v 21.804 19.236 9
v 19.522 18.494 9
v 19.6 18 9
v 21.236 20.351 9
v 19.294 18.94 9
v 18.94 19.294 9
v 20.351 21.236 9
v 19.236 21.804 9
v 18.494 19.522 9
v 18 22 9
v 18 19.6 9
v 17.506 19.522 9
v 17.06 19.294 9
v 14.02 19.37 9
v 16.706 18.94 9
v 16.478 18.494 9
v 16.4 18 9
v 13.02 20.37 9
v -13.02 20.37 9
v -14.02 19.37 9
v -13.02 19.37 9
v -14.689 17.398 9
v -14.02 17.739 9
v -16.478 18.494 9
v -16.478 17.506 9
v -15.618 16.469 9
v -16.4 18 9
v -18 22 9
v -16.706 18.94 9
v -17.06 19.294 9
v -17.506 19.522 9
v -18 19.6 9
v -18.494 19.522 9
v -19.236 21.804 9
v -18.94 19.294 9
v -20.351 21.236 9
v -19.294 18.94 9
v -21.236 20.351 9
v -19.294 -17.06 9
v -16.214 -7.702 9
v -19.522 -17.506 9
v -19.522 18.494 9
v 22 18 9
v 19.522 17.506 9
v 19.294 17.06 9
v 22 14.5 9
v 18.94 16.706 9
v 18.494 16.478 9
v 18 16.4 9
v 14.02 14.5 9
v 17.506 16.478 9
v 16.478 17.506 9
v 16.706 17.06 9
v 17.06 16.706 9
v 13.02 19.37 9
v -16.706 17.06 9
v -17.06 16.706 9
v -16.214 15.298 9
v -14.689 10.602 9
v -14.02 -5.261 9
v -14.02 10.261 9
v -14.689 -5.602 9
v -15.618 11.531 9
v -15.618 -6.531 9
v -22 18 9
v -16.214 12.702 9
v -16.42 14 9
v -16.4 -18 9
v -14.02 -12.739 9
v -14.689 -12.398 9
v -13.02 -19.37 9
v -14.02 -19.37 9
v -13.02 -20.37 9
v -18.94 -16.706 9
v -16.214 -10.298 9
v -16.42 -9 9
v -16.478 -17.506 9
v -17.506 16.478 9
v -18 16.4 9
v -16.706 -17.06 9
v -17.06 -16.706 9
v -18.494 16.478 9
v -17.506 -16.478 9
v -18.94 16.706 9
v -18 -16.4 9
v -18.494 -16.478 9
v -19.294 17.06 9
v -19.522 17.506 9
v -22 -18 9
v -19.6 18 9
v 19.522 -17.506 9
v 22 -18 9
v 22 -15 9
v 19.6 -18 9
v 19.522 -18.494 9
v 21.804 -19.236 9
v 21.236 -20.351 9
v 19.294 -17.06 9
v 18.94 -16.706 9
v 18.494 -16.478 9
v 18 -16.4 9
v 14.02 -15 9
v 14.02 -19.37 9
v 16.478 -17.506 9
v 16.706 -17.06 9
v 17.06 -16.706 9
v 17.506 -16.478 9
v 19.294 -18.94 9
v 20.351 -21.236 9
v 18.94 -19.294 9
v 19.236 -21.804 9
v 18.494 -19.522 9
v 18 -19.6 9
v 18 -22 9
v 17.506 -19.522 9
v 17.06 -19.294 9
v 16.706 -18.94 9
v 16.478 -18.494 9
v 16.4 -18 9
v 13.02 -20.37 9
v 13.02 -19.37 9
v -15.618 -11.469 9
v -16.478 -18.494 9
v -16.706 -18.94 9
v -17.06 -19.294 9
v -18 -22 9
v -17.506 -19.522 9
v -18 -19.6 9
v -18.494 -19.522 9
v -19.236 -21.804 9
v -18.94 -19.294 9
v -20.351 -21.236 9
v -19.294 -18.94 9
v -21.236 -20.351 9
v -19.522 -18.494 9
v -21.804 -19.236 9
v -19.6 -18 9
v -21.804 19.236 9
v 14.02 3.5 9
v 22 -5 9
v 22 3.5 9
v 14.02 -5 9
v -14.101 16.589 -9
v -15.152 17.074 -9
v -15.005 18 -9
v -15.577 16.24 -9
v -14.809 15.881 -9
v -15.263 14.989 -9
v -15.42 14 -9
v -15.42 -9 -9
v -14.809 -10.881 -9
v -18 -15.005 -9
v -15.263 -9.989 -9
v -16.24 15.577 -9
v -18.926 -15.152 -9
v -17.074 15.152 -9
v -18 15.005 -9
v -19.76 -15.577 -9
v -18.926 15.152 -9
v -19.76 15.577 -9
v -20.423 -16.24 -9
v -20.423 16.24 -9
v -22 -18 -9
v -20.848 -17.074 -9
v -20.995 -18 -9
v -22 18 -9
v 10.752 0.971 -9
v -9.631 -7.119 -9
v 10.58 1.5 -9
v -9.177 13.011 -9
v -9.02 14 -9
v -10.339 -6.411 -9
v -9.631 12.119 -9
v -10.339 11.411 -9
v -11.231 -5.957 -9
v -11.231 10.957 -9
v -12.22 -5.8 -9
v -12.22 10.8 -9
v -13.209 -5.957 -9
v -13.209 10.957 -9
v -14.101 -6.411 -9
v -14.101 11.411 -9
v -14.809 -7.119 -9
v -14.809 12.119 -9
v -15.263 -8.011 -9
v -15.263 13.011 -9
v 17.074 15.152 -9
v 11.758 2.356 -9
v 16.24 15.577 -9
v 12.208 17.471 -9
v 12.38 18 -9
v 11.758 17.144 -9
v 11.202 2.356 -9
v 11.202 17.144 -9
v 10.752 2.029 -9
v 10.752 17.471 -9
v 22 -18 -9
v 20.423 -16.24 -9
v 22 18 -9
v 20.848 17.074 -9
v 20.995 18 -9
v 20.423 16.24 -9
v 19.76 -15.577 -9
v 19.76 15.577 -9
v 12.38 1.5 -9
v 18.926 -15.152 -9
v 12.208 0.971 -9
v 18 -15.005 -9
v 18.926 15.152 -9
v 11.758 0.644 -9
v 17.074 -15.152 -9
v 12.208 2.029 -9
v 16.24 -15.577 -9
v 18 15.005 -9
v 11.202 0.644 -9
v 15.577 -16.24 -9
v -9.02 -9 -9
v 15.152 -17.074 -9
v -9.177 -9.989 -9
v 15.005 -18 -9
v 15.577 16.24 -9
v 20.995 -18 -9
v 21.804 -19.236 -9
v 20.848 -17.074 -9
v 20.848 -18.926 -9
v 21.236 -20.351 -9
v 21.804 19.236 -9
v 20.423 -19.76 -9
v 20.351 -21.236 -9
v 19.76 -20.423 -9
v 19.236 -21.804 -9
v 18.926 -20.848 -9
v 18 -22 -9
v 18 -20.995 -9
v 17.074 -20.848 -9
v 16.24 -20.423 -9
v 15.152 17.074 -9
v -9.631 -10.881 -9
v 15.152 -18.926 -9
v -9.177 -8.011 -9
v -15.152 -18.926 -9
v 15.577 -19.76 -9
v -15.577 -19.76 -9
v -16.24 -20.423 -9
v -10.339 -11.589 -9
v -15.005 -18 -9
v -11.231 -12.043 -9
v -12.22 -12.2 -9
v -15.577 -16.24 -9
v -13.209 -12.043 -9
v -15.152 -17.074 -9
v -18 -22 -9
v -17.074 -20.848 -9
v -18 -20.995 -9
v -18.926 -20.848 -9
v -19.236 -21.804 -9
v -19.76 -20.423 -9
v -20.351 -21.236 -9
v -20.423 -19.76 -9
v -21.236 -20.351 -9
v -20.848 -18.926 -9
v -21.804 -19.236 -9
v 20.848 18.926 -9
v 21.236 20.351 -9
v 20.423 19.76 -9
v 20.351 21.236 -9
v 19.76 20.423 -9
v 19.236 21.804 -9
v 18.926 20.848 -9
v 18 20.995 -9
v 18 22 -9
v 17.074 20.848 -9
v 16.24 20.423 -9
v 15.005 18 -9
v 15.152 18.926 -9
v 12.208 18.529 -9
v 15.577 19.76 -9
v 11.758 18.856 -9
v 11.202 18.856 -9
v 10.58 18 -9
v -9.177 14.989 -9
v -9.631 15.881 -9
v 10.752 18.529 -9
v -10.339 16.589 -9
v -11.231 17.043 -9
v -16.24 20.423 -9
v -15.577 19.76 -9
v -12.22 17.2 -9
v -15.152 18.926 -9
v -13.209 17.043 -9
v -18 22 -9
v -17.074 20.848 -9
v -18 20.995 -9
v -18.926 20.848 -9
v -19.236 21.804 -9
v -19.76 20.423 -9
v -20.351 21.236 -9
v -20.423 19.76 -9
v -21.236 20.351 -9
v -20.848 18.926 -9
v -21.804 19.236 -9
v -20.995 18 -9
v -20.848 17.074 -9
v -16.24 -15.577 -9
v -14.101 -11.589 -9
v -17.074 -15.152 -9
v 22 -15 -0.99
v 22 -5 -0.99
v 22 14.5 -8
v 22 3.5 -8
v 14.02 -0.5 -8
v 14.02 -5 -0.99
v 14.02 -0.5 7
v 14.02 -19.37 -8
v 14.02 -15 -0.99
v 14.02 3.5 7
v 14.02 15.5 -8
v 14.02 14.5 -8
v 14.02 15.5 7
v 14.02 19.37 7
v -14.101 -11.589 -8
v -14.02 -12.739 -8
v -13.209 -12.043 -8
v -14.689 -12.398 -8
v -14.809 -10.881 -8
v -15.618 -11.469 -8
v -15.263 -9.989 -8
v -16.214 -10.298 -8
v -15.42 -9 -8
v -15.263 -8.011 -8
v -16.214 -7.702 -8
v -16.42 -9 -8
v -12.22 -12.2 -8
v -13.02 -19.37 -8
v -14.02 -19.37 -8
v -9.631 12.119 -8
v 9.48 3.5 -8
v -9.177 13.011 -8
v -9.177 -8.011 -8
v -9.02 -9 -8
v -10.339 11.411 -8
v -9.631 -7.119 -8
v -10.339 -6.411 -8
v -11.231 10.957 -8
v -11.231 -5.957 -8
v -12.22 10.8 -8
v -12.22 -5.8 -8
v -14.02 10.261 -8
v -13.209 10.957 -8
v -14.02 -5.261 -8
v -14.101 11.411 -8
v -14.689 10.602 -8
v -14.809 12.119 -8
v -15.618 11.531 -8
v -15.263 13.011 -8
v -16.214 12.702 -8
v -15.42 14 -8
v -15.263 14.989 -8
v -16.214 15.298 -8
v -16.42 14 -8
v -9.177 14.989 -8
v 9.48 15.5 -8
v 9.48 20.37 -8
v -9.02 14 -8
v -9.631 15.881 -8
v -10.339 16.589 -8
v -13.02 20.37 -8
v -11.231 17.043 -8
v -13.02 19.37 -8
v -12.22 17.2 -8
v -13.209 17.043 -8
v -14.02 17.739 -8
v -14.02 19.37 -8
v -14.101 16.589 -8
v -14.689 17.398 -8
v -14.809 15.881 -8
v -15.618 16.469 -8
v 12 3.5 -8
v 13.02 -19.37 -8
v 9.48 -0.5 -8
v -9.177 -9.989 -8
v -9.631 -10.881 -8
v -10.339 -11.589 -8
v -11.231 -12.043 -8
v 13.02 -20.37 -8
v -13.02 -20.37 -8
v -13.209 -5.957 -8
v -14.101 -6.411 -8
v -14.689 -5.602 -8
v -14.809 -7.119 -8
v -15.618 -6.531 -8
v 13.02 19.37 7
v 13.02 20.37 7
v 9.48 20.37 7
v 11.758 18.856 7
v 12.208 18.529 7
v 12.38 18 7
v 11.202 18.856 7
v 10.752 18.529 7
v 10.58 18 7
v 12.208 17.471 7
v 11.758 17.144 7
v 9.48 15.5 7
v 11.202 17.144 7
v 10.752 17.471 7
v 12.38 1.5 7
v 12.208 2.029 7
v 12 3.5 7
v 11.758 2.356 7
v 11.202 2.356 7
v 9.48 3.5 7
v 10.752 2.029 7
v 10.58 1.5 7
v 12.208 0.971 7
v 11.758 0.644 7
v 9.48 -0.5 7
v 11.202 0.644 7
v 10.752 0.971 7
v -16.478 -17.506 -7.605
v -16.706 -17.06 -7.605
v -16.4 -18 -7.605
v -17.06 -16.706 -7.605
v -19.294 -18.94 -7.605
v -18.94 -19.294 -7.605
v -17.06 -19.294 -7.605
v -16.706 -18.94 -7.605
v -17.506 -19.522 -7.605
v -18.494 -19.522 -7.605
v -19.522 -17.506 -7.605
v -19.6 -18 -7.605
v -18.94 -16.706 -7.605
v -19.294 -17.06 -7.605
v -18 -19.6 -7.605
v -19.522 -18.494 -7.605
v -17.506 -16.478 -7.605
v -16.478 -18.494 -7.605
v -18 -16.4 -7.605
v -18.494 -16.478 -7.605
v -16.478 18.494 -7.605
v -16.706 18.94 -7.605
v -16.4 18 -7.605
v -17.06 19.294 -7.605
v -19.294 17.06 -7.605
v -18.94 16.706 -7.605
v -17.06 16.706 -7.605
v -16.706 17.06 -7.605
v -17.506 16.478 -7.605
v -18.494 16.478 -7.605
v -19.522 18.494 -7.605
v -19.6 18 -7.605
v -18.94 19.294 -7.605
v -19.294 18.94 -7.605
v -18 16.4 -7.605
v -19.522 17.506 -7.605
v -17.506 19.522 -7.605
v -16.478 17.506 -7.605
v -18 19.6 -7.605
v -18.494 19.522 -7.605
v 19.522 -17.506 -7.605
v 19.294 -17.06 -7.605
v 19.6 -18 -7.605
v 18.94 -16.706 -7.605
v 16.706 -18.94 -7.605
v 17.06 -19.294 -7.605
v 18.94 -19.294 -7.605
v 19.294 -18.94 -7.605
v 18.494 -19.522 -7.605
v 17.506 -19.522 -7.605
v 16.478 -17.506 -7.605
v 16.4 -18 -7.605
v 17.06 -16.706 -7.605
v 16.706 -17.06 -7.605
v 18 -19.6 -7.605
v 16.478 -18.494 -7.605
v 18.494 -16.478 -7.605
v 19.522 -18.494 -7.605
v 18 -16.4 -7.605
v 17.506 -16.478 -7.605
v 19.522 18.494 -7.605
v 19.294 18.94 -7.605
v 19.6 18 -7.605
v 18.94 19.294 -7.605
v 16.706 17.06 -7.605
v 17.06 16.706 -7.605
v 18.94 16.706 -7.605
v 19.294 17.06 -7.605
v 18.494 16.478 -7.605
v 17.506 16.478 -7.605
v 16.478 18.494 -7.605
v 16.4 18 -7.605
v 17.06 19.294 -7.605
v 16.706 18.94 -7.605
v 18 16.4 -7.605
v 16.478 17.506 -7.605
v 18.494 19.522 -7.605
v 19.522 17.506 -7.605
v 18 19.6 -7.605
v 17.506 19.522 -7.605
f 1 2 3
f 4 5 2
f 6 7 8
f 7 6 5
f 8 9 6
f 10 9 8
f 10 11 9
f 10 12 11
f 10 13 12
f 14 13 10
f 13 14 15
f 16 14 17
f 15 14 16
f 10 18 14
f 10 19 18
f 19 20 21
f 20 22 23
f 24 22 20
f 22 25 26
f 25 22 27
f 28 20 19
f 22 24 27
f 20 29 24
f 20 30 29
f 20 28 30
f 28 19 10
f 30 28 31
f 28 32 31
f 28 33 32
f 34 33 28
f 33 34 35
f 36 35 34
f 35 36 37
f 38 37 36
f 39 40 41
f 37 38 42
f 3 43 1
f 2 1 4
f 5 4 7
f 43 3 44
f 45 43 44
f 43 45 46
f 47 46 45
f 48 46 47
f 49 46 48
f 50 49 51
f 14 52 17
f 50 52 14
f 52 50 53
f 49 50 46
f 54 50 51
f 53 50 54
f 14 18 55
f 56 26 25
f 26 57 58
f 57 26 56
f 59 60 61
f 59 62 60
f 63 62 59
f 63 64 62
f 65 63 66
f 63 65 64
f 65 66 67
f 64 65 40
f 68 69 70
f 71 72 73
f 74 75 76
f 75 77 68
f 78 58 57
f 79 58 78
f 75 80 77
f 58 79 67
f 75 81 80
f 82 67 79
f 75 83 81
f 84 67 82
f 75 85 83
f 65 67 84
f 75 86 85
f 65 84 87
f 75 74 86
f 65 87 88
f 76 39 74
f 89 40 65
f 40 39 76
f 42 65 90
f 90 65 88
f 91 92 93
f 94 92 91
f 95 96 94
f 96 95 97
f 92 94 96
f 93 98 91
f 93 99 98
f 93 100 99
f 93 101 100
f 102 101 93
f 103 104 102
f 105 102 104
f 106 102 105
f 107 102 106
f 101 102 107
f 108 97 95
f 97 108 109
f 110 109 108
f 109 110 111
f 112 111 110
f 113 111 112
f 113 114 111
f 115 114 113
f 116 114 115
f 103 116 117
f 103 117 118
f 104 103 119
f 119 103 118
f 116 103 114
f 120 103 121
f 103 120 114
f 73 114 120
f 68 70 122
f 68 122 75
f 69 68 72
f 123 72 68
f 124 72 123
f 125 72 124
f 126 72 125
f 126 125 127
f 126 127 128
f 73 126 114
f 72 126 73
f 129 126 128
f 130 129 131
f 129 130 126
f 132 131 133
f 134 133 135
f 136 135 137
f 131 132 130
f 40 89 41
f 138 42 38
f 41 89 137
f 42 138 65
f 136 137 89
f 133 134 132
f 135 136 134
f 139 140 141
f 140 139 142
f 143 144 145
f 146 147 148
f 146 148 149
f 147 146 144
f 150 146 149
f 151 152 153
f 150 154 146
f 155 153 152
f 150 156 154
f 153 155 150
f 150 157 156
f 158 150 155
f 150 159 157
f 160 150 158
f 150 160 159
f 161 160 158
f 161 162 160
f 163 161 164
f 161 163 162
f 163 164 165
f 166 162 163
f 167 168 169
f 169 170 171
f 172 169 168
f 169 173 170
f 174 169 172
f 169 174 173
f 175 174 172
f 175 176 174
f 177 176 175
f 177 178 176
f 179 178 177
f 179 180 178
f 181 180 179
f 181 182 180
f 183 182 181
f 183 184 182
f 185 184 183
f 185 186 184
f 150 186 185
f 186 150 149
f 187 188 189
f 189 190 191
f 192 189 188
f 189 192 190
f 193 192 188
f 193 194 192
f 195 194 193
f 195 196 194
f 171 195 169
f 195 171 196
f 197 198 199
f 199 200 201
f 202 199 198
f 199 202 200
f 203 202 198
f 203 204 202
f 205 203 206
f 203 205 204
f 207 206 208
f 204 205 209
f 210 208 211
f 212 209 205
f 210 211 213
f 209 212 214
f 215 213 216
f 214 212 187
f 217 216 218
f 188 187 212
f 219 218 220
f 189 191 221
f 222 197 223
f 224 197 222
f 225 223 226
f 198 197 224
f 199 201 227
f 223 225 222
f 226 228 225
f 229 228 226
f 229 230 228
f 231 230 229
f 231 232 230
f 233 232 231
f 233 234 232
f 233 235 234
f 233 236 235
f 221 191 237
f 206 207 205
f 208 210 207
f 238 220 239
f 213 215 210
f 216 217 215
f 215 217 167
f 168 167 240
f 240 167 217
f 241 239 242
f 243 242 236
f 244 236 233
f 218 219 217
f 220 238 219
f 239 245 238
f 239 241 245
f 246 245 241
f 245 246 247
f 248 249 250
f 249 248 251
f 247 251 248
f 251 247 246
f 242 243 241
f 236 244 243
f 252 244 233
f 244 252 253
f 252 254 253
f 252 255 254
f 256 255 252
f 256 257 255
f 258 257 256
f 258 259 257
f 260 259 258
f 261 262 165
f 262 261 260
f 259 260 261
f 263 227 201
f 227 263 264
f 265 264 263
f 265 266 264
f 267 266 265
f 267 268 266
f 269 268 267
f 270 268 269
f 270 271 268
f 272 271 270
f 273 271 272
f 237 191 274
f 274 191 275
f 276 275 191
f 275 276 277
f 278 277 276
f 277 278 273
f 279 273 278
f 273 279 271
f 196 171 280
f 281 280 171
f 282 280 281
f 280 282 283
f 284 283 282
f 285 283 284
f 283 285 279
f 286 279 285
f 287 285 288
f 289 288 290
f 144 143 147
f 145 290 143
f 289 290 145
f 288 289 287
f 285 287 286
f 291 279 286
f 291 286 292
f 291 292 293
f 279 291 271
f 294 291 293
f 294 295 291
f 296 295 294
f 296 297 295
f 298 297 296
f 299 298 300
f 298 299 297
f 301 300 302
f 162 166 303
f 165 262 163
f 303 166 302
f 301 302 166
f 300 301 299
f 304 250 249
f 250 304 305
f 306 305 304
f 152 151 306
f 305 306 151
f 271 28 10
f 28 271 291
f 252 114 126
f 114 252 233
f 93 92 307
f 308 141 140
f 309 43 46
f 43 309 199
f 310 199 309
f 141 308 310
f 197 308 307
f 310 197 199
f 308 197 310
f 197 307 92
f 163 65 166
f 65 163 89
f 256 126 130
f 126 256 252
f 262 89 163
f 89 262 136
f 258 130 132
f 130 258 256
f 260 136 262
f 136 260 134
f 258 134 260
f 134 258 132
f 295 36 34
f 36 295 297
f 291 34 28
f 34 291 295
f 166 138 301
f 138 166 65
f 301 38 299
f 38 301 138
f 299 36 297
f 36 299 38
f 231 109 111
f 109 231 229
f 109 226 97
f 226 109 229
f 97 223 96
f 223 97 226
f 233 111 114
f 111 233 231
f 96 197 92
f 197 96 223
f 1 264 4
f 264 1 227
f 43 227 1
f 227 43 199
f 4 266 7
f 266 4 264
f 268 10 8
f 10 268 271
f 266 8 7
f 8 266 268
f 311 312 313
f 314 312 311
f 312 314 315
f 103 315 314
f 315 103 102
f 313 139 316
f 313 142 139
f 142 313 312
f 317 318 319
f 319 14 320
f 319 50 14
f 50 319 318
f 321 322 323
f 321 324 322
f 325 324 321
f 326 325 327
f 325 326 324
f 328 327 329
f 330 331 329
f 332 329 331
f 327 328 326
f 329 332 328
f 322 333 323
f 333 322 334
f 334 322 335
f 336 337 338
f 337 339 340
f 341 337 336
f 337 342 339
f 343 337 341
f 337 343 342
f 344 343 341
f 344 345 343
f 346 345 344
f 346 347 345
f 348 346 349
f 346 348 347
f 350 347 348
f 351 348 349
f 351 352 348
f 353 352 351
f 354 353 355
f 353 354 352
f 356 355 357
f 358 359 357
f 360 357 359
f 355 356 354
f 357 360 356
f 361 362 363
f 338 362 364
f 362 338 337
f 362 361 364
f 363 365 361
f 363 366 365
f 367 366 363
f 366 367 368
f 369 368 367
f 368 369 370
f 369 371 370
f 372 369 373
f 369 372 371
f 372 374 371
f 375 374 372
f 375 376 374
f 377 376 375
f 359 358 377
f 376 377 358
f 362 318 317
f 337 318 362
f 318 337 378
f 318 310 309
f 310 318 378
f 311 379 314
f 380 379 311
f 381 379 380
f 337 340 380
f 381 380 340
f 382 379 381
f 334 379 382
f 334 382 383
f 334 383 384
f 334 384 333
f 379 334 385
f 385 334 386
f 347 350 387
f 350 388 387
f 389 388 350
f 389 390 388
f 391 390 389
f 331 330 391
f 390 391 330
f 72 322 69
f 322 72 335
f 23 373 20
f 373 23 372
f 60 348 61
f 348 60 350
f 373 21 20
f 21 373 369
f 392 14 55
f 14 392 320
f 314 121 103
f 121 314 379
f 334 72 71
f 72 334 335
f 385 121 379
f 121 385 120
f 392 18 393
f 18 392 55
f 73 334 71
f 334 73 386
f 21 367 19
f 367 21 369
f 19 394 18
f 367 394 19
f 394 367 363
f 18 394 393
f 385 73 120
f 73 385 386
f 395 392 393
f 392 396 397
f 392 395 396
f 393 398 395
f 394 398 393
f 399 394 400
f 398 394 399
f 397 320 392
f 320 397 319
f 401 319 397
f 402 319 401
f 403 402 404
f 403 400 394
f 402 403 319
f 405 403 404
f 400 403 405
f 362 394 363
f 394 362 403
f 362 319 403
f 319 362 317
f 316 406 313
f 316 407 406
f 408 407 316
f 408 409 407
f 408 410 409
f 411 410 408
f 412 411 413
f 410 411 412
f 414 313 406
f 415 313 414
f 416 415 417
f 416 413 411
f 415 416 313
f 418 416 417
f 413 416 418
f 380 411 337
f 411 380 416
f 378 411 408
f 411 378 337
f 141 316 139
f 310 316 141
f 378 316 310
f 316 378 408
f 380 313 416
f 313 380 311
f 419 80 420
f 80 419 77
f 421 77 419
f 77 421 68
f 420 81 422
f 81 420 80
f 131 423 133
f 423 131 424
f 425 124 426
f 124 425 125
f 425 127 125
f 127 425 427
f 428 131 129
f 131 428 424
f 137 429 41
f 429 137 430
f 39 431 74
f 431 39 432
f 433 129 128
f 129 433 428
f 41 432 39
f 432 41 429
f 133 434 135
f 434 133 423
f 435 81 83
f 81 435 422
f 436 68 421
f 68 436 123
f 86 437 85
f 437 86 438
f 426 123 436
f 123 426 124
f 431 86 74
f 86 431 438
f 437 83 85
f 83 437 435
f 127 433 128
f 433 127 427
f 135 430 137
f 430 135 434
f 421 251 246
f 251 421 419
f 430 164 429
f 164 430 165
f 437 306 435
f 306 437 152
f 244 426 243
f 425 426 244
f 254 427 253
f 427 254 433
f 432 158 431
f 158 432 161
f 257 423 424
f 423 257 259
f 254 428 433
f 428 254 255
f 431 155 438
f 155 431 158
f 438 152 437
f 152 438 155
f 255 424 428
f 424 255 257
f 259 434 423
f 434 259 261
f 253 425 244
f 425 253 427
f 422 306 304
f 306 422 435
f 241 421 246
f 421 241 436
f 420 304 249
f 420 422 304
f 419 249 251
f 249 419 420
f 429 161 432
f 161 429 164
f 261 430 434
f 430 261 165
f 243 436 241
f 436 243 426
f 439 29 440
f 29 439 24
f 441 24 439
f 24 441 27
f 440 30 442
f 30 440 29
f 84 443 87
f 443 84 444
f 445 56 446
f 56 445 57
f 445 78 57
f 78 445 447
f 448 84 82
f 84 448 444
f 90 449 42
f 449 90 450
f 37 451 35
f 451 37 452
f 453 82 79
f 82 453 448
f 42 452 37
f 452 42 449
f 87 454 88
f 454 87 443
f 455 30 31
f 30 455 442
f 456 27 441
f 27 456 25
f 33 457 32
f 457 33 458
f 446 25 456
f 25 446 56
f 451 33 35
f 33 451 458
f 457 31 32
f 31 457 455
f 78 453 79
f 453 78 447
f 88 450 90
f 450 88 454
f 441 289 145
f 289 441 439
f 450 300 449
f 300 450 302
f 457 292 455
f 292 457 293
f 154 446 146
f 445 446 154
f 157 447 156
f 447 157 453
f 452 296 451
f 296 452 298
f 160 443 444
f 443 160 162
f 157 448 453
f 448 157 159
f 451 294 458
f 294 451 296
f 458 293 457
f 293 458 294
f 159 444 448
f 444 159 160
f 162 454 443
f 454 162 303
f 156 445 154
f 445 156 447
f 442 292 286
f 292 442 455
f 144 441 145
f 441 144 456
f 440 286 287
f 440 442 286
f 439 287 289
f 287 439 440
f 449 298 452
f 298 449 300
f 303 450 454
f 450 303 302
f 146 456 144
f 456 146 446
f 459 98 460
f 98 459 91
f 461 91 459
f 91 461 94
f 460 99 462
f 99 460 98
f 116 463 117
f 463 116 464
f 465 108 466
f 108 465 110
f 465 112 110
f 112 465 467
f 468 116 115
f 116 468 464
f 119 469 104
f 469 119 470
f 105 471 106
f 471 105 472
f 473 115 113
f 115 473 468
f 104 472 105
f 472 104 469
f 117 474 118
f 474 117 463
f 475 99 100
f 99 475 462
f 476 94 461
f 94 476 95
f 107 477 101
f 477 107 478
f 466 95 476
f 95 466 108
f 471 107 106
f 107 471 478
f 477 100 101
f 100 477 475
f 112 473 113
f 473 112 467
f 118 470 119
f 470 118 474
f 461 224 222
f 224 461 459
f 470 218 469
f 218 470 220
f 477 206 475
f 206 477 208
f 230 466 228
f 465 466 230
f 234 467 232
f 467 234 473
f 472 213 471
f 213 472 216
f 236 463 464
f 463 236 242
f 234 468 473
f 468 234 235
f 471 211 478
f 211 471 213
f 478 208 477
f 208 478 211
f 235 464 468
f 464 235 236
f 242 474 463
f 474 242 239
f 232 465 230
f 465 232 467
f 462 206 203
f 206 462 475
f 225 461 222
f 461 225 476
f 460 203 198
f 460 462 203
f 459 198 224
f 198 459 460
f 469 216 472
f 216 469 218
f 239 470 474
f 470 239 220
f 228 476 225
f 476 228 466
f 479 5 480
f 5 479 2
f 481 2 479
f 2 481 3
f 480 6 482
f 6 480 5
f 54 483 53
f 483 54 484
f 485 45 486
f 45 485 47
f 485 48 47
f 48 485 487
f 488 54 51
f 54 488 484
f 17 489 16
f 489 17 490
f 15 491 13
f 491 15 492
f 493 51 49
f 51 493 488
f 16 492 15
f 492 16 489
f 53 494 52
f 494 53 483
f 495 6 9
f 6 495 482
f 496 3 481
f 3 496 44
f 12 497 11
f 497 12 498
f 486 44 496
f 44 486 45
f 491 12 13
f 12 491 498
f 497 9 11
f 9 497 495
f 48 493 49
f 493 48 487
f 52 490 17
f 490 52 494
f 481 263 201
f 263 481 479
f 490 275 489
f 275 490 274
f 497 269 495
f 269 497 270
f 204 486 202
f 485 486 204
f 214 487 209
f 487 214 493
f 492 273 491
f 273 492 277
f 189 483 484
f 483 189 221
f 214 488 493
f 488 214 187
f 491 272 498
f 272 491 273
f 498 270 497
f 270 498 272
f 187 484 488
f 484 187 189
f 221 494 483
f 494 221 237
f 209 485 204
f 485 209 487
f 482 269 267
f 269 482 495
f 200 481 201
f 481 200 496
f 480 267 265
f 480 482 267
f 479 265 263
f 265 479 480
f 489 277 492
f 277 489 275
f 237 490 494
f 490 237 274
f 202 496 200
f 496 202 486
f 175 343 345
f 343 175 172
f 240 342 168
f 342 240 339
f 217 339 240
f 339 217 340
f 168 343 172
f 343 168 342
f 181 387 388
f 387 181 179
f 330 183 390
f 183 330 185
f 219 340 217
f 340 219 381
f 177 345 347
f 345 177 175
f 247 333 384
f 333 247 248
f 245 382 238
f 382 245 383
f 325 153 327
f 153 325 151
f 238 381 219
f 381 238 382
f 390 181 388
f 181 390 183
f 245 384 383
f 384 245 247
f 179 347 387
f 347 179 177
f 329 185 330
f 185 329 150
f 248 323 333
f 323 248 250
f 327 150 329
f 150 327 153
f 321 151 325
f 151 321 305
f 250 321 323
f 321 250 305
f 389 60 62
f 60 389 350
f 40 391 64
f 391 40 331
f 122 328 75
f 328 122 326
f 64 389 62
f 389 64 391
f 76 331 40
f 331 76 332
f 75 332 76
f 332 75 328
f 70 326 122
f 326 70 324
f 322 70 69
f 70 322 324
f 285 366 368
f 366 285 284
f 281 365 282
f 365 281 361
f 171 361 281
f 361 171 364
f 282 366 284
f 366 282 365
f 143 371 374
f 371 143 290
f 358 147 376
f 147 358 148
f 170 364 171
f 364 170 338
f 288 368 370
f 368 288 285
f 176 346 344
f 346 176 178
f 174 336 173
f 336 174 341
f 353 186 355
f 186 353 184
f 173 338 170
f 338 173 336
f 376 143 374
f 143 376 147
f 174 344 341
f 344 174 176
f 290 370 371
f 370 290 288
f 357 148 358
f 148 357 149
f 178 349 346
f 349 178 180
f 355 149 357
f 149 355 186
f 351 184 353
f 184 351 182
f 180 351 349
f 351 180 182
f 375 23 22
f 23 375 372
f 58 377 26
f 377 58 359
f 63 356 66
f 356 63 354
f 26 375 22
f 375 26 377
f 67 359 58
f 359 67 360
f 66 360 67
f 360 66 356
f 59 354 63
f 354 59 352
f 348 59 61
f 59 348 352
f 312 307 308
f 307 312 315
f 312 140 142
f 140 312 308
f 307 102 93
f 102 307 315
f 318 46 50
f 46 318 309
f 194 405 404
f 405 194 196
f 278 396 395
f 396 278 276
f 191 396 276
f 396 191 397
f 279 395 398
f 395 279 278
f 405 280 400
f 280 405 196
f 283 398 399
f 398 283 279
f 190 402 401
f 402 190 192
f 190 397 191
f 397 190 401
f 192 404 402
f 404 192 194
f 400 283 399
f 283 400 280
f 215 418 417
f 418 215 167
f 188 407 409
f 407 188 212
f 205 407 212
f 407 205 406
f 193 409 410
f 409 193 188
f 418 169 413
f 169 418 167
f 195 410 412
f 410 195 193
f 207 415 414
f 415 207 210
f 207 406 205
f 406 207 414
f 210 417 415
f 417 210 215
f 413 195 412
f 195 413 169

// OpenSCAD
// file: electronics.scad
/*
 * electronics.scad 
 *
 * (c) 2015 Prof Dr Andreas Mueller, Hochschule Rapperswil
 */
board_width = 27.94 + 0.1;
board_height = 40.64 + 0.1;
board_thickness = 2.0;

gap = 0.1;

width = 44;
height = 44;
r = 4;
bottom_height = 6;
top_height = 18;

button1_x = -board_width / 2 + 1.8;
button1_y = -9;

button2_x = -board_width / 2 + 1.8;
button2_y = +14;

led1_x = 25.5 - board_width/2;
led1_y = 18;
led2_x = led1_x;
led2_y = 1.5;

switchwidth = 3.5;
switchheight = 4.5;

button_gap = 0.2;

module bottom_part() {
	difference() {
		union() {
			cube([width - 2 * r, height, bottom_height], center = true);
			cube([width, height - 2 * r, bottom_height], center = true);
			translate([-width/2 + r, -height/2 + r, 0])
				cylinder(r = r, h = bottom_height, center = true, $fn = 30);
			translate([-width/2 + r, +height/2 - r, 0])
				cylinder(r = r, h = bottom_height, center = true, $fn = 30);
			translate([+width/2 - r, -height/2 + r, 0])
				cylinder(r = r, h = bottom_height, center = true, $fn = 30);
			translate([+width/2 - r, +height/2 - r, 0])
				cylinder(r = r, h = bottom_height, center = true, $fn = 30);
		}
		union() {
			translate([0, 0, bottom_height - board_thickness])
				cube([board_width + gap, board_height + gap, bottom_height], center = true);
			translate([0, 0, 1])
				cube([board_width - 2, board_height - 2, bottom_height], center = true);
			translate([-width/2 + r, -height/2 + r, 0])
				cylinder(r = 1.6, h = bottom_height + 11, center = true, $fn = 20);
			translate([-width/2 + r, +height/2 - r, 0])
				cylinder(r = 1.6, h = bottom_height + 1, center = true, $fn = 20);
			translate([+width/2 - r, -height/2 + r, 0])
				cylinder(r = 1.6, h = bottom_height + 1, center = true, $fn = 20);
			translate([+width/2 - r, +height/2 - r, 0])
				cylinder(r = 1.6, h = bottom_height + 1, center = true, $fn = 20);
			translate([button1_x, -button1_y, 1])
				cylinder(r = 4 + button_gap, h = bottom_height,  center = true, $fn = 30);
			translate([button2_x, -button2_y, 1])
				cylinder(r = 4 + button_gap, h = bottom_height,  center = true, $fn = 30);
		}
	}
	translate([width/2 - 1.5, -9, 15/2 + bottom_height/2 - 0.01])
		cube([3, 10.5, 15], center = true);
}

module	screwhole() {
		cylinder(r = 1.6, h = top_height + 1, center = true, $fn = 20);
		translate([0, 0, -(top_height + 0.01) / 2])
			cylinder(r1 = 3, r2 = 0, h = 3, $fn = 20);
}

module button_cutout() {
	cylinder(r = 3 + button_gap, h = top_height + 0.1, center = true, $fn = 20);
	translate([0, 0, 1])
		cylinder(r = 4 + button_gap, h = top_height, center = true, $fn = 20);
}

module top_part() {
	difference() {
		union() {
			cube([width - 2 * r, height, top_height], center = true);
			cube([width, height - 2 * r, top_height], center = true);
			translate([-width/2 + r, -height/2 + r, 0])
				cylinder(r = r, h = top_height, center = true, $fn = 20);
			translate([-width/2 + r, +height/2 - r, 0])
				cylinder(r = r, h = top_height, center = true, $fn = 20);
			translate([+width/2 - r, -height/2 + r, 0])
				cylinder(r = r, h = top_height, center = true, $fn = 20);
			translate([+width/2 - r, +height/2 - r, 0])
				cylinder(r = r, h = top_height, center = true, $fn = 20);
		}
		union() {
			difference() {
				union() {
					translate([0, 0, 1])
						cube([board_width, board_height - 2, top_height], center = true);
					translate([0, 0, 1])
						cube([board_width - 2, board_height, top_height], center = true);
				}
				translate([led1_x + 1, led1_y, -2])
					cube([6, 5, top_height], center = true);
				translate([led2_x + 1, led2_y, -2])
					cube([6, 4, top_height], center = true);
			}
			translate([-width/2 + r, -height/2 + r, 0])
				screwhole();
			translate([-width/2 + r, +height/2 - r, 0])
				screwhole();
			translate([+width/2 - r, -height/2 + r, 0])
				screwhole();
			translate([+width/2 - r, +height/2 - r, 0])
				screwhole();
			// opening for the power connector
			translate([width/2, -10, top_height/2 - 4.99])
				cube([20, 10, 10], center = true);
			// opening for 
			translate([width/2,  9, 1])
				cube([20, 11, top_height], center = true);
			// openings for buttons
			translate([button1_x, button1_y, 0])
				button_cutout();
			translate([button2_x, button2_y, 0])
				button_cutout();
			// holes for fibre optics
			translate([led1_x, led1_y, 0])
				cylinder(r = 0.9, h = top_height + 1, center = true, $fn = 10);
			translate([led2_x, led2_y, 0])
				cylinder(r = 0.9, h = top_height + 1, center = true, $fn = 10);
		}
	}
//	translate([button1_x, button1_y, 0]) button();
//	translate([button2_x, button2_y, 0]) button();
}

module button() {
	difference() {
		union() {
			translate([0, 0, -1])
				cylinder(r = 3, h = top_height, center = true, $fn = 20);
			translate([0, 0, 1])
				cylinder(r = 4, h = top_height - 4, center = true, $fn = 20);
			translate([0, 0, -(top_height - 4) / 2])
				cylinder(r1 = 2, r2 = 4, h = 2, center = true, $fn = 20);
		}
		translate([-switchwidth/2 + 4, 0, top_height - switchheight])
			cube([10, 10, top_height], center = true);
	}
}
// main file
/*
 * top.scad -- top part of the electornics housing
 *
 * (c) 2015 Prof Dr Andreas Mueller, Hochschule Rapperswil
 */

include <electronics.scad>

top_part();
